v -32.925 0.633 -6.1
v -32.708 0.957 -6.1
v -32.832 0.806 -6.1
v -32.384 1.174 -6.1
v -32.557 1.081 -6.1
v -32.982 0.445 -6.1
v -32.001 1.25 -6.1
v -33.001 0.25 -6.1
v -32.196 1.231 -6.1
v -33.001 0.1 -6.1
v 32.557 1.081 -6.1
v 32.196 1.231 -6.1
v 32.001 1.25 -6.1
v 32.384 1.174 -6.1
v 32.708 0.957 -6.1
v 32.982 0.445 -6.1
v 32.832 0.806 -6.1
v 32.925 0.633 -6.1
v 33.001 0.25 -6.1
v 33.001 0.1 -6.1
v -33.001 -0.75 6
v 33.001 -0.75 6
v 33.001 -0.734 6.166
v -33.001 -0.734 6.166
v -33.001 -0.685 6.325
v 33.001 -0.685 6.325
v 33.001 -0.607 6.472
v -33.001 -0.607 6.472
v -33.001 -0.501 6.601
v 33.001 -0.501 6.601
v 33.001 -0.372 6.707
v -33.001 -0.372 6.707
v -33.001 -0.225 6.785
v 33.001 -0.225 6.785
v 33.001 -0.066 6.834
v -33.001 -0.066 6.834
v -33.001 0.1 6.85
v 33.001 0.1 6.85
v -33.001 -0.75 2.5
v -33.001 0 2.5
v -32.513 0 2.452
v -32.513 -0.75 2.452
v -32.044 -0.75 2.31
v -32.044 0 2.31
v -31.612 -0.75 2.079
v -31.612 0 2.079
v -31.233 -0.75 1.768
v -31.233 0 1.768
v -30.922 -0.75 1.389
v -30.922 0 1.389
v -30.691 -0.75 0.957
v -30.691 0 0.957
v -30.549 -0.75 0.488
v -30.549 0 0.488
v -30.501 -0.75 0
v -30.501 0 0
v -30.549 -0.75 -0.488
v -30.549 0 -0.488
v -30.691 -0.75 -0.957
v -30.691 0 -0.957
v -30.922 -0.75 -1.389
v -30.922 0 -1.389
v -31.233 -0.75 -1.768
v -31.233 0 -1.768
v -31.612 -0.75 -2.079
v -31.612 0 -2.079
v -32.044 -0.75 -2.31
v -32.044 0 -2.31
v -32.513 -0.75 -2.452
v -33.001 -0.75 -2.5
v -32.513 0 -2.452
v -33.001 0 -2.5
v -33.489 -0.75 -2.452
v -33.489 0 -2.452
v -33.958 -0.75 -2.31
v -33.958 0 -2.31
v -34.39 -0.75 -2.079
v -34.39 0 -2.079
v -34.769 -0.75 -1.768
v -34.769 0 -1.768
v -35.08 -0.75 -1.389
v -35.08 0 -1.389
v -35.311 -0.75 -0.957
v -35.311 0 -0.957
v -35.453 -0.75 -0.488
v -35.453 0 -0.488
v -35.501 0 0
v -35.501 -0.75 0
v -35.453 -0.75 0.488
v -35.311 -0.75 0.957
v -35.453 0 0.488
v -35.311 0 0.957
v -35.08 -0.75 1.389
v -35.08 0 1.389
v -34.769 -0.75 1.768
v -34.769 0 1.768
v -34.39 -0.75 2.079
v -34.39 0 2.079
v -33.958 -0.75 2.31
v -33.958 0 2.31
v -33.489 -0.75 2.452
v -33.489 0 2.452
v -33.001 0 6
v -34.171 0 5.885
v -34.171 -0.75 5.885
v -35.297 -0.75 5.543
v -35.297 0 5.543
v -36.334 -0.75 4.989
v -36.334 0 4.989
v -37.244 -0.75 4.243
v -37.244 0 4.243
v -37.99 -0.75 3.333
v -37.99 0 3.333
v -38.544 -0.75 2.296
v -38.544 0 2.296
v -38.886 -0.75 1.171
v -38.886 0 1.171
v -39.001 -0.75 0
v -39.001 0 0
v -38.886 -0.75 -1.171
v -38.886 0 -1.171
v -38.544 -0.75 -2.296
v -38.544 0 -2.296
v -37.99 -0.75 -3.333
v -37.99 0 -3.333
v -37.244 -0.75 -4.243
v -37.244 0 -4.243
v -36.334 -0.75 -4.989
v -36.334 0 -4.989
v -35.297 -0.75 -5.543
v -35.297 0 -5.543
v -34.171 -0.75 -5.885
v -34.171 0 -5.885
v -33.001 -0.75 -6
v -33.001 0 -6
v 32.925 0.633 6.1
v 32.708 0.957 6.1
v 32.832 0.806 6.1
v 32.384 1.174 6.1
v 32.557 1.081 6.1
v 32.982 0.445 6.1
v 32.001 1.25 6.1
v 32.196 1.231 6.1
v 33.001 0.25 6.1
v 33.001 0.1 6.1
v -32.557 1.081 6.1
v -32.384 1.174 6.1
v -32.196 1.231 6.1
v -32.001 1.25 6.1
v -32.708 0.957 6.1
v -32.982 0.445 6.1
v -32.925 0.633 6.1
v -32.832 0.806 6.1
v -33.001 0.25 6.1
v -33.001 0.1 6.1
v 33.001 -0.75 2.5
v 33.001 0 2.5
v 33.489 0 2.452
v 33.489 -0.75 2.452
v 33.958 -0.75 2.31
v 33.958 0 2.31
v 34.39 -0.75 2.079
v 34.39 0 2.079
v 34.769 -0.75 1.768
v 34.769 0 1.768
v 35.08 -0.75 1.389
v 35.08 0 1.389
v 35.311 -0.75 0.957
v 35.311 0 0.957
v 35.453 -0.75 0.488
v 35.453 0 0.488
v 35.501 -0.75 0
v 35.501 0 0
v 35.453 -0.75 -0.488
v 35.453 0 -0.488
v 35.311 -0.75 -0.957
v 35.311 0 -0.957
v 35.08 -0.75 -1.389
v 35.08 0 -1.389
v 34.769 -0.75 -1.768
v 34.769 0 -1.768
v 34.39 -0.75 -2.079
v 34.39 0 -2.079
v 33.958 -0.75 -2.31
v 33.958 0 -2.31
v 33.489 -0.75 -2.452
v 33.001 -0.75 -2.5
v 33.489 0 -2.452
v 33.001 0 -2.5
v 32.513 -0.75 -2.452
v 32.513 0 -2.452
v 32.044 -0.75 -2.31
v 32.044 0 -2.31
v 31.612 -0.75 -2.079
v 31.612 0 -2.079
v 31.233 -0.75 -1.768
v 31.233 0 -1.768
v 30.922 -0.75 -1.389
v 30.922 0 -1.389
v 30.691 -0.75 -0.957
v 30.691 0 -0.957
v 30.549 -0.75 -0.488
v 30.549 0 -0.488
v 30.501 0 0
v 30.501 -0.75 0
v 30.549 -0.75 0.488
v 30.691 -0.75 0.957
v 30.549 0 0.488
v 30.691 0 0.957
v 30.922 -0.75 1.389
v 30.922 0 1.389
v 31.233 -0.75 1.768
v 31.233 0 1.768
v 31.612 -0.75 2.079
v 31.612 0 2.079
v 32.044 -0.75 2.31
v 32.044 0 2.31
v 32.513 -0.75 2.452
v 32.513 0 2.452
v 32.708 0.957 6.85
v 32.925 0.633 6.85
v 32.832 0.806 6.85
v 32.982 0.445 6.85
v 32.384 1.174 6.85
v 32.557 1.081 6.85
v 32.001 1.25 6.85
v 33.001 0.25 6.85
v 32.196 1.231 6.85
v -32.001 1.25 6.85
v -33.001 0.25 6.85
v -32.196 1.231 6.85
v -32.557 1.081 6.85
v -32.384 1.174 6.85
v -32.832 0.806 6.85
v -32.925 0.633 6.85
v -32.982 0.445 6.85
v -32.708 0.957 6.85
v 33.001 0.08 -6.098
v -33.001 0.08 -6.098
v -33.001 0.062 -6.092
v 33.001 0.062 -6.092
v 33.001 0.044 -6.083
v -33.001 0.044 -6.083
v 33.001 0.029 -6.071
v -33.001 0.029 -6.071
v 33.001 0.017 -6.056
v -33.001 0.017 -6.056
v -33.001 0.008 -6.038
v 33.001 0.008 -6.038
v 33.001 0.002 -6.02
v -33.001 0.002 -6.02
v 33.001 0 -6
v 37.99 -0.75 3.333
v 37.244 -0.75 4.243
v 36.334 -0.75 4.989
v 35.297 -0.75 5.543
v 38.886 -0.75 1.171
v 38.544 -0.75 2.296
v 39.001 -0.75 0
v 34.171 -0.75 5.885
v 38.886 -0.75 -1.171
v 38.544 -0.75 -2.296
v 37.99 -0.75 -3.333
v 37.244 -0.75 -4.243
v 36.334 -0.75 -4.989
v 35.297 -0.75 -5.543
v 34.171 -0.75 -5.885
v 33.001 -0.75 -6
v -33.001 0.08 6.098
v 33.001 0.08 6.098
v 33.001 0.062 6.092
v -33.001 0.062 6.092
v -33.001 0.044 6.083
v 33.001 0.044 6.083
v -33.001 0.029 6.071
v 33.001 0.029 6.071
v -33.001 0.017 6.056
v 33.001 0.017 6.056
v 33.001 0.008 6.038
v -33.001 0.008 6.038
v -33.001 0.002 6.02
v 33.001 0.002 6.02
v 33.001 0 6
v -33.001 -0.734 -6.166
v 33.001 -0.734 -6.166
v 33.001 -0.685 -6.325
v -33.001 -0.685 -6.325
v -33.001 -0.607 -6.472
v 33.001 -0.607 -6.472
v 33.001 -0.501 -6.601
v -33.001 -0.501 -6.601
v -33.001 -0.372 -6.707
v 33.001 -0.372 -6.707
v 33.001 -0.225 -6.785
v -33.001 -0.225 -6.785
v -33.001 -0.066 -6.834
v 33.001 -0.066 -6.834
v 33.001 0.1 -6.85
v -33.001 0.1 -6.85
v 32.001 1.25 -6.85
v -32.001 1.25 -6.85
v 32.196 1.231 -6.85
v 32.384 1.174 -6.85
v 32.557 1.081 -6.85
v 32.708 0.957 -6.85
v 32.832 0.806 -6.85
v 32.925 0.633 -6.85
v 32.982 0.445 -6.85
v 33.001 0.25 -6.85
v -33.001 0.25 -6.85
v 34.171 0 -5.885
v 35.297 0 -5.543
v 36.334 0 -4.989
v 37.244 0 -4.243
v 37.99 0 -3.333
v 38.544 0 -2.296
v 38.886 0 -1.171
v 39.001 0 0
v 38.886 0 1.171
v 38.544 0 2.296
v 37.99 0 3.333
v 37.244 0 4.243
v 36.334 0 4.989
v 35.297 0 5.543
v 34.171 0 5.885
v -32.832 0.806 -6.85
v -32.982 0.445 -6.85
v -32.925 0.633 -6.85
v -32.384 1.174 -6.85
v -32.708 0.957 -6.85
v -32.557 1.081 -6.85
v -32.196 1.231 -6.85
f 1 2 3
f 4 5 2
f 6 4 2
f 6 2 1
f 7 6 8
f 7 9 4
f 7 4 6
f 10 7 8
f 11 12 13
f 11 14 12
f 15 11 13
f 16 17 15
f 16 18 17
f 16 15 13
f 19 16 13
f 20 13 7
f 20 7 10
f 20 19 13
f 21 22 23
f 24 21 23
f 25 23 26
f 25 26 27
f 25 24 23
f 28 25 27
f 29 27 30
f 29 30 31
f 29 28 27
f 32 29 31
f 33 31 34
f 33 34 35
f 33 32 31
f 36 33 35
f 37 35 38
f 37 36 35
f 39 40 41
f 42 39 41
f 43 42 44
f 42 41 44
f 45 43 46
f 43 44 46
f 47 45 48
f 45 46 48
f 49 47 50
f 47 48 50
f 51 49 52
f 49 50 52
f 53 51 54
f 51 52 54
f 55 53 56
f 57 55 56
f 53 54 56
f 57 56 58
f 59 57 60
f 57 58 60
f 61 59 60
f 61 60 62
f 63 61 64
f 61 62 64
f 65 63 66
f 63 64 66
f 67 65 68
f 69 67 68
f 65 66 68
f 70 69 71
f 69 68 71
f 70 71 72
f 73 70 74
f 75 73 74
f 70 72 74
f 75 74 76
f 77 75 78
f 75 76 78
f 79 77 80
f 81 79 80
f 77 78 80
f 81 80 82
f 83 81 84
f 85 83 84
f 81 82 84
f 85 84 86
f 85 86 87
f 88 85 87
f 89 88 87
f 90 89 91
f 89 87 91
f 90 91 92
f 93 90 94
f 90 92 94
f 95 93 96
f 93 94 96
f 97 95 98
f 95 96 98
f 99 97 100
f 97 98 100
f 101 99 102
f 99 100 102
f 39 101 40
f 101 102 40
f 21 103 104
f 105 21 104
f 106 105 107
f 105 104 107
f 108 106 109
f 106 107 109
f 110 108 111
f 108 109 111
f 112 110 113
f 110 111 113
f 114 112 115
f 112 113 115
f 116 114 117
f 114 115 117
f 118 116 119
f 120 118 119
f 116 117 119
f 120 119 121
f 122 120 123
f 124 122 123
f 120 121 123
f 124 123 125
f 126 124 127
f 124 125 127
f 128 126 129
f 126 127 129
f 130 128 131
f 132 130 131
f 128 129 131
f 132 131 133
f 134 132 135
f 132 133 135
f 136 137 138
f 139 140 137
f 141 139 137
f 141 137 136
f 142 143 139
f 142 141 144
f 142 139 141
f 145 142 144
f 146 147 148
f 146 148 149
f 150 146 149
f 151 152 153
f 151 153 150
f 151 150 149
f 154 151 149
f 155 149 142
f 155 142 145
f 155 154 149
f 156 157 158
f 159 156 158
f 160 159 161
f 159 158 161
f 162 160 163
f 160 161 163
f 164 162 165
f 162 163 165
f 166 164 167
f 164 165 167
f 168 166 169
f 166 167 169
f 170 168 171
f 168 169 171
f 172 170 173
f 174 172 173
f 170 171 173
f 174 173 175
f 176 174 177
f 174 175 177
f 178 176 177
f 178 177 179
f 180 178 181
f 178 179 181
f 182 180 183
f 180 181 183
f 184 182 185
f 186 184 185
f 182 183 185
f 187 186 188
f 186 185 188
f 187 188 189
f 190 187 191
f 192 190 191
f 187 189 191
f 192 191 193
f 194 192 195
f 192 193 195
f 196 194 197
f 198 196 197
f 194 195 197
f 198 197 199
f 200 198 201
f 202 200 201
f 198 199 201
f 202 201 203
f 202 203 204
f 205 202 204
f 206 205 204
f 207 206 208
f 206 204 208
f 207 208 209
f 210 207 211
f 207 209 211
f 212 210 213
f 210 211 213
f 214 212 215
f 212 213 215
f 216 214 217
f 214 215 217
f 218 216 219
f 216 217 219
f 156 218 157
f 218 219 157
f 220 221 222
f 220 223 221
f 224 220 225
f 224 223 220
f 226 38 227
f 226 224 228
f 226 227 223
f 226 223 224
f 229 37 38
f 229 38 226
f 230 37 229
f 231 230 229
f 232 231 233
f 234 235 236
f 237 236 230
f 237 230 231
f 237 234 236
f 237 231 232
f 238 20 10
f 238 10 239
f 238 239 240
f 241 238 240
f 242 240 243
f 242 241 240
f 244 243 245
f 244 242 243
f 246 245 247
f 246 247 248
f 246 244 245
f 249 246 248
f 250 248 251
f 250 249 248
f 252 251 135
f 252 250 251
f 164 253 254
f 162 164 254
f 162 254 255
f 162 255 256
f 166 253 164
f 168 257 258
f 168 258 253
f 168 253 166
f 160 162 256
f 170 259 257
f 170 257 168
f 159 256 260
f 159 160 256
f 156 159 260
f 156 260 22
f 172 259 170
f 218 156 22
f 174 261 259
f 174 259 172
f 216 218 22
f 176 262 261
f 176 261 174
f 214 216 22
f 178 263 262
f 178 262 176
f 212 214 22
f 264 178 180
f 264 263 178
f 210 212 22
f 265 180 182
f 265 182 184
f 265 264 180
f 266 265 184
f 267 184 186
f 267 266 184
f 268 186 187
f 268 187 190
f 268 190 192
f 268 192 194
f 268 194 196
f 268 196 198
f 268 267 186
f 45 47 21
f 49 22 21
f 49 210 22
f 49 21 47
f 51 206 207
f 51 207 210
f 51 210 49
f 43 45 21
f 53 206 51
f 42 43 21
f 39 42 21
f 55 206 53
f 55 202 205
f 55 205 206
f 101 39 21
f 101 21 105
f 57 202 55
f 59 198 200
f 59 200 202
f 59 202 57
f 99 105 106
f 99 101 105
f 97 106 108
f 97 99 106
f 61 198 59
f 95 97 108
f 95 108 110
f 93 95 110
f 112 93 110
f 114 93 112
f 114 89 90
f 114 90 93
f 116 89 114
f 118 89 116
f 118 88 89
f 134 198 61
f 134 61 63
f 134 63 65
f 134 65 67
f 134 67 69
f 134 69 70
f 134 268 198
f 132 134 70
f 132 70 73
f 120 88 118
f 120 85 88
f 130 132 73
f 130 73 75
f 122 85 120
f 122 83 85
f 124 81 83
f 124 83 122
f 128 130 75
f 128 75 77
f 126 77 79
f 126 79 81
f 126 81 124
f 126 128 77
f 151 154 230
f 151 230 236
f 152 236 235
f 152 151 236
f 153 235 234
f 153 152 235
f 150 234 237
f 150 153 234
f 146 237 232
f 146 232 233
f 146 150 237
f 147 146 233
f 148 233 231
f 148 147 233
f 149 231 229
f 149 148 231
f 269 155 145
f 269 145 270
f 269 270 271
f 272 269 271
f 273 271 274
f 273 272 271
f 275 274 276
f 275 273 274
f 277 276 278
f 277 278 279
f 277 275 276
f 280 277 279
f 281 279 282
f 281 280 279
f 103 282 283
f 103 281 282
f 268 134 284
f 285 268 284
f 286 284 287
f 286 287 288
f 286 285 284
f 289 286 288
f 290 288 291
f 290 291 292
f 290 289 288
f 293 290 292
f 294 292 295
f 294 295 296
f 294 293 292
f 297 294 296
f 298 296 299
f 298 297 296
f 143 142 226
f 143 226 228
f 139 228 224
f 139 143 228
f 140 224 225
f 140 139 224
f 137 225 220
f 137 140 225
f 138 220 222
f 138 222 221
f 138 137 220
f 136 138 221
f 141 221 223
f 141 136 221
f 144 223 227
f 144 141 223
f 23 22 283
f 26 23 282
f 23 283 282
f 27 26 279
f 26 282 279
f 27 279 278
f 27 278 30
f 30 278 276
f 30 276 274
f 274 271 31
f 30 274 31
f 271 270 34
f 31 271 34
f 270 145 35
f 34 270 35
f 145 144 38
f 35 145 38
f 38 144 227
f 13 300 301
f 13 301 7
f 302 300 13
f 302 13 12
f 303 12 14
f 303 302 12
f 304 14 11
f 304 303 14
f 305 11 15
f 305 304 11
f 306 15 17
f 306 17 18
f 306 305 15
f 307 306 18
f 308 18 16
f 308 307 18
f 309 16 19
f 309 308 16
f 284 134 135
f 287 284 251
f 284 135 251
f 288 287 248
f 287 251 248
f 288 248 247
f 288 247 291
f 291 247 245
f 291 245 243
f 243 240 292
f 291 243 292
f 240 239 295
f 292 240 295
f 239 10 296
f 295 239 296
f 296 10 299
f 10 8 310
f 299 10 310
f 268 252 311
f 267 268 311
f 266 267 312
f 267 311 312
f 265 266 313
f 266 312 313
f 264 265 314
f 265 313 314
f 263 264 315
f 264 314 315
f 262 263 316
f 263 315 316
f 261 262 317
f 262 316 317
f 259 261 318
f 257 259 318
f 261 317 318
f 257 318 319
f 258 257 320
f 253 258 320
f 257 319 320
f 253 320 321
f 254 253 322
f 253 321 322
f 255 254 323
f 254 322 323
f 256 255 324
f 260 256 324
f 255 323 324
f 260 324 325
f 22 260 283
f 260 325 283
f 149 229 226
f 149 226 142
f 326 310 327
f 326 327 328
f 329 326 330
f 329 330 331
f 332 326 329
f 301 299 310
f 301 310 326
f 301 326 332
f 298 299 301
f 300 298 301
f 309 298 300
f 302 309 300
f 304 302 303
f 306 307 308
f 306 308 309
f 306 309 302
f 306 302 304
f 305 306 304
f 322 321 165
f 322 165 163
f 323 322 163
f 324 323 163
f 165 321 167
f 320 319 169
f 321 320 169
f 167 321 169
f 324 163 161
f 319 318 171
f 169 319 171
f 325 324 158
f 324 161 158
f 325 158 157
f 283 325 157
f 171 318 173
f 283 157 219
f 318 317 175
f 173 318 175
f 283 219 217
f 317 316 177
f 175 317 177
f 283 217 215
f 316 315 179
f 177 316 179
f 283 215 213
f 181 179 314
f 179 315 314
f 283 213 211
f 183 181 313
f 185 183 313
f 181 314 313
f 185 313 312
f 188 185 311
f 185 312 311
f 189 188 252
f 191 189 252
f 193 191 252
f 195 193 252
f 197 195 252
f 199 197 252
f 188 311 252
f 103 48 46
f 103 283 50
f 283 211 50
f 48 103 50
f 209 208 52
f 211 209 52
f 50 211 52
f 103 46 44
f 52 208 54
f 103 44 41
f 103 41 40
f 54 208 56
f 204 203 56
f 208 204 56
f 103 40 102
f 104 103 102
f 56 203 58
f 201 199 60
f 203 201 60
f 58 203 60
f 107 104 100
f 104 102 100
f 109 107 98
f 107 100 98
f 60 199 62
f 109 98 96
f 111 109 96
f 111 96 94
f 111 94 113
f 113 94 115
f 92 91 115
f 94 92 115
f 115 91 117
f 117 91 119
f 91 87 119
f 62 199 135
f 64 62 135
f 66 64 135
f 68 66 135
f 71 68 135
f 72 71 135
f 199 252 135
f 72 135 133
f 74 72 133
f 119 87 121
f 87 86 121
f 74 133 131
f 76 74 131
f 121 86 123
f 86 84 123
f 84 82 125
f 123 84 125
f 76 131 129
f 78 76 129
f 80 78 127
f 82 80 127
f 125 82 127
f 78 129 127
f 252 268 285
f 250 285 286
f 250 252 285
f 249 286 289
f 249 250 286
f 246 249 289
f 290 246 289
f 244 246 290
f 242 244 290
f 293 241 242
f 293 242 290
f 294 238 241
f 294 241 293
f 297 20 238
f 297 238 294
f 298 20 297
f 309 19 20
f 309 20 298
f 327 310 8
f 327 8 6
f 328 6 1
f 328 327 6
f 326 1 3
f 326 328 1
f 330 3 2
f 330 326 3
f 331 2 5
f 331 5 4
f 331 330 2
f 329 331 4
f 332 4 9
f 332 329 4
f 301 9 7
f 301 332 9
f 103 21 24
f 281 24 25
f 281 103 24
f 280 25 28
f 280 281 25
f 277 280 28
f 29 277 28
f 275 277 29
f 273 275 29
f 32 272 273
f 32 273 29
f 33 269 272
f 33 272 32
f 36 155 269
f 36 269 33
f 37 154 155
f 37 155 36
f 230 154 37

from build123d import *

# Parameters (mm, degrees)
SKETCH2_R               = 2.5
BASE_FLANGE1_DEPTH      = 0.75
EDGE_FLANGE1_DEPTH      = 66.001893912
EDGE_FLANGE1_BEND_DEPTH = 66.001893912
BREAK_CORNER1_START     = -6.85
BREAK_CORNER1_DEPTH     = 13.7


# Read off the part's stored shape, not the designer's step: Break-Corner1
# Sheet-metal steps are written as plain solids
with BuildPart() as part:
    # Sketch2 → Base-Flange1 (new body)
    with BuildSketch(Plane(origin=(0, 0, 0), x_dir=(1, 0, 0), z_dir=(0, 1, 0))):
        with BuildLine():
            Line((-33.000946956, 6), (33.000946956, 6))
            ThreePointArc((33.000946956, 6), (39.000946956, 0), (33.000946956, -6))
            Line((33.000946956, -6), (-33.000946956, -6))
            ThreePointArc((-33.000946956, -6), (-39.000946956, 0), (-33.000946956, 6))
        make_face()
        with Locations(Location((33.000946956, 0, 0), (0, 0, 270))):
            Circle(SKETCH2_R, mode=Mode.SUBTRACT)
        with Locations(Location((-33.000946956, 0, 0), (0, 0, 270))):
            Circle(SKETCH2_R, mode=Mode.SUBTRACT)
    extrude(amount=-BASE_FLANGE1_DEPTH)

    # Edge-Flange1 section (across the edge) → Edge-Flange1 (add)
    with BuildSketch(Plane(origin=(-33.000946956, 0, 6.1), x_dir=(0, 0, -1), z_dir=(1, 0, 0))):
        with BuildLine():
            Line((-0.75, 0.1), (-0.75, 1.25))
            Line((-0.75, 1.25), (0, 1.25))
            Line((0, 1.25), (0, 0.1))
            ThreePointArc((0, 0.1), (0.029289322, 0.029289322), (0.1, 0))
            Line((0.1, 0), (0.1, -0.75))
            ThreePointArc((0.1, -0.75), (-0.501040764, -0.501040764), (-0.75, 0.1))
        make_face()
    extrude(amount=EDGE_FLANGE1_DEPTH)

    # Edge-Flange1 section 2 (across the edge) → Edge-Flange1 bend (add)
    with BuildSketch(Plane(origin=(33.000946956, 0, -6.1), x_dir=(0, 0, 1), z_dir=(-1, 0, 0))):
        with BuildLine():
            Line((-0.75, 0.1), (-0.75, 1.25))
            Line((-0.75, 1.25), (0, 1.25))
            Line((0, 1.25), (0, 0.1))
            ThreePointArc((0, 0.1), (0.029289322, 0.029289322), (0.1, 0))
            Line((0.1, 0), (0.1, -0.75))
            ThreePointArc((0.1, -0.75), (-0.501040764, -0.501040764), (-0.75, 0.1))
        make_face()
    extrude(amount=EDGE_FLANGE1_BEND_DEPTH)

    # Break-Corner1 outline → Break-Corner1 (cut)
    with BuildSketch(Plane.XY.offset(BREAK_CORNER1_START)):
        with BuildLine():
            ThreePointArc((-33.000946956, 0.25), (-32.708053737, 0.957106781), (-32.000946956, 1.25))
            Line((-32.000946956, 1.25), (-33.000946956, 1.25))
            Line((-33.000946956, 1.25), (-33.000946956, 0.25))
        make_face()
        with BuildLine():
            ThreePointArc((32.000946956, 1.25), (32.708053737, 0.957106781), (33.000946956, 0.25))
            Line((33.000946956, 0.25), (33.000946956, 1.25))
            Line((33.000946956, 1.25), (32.000946956, 1.25))
        make_face()
    extrude(amount=BREAK_CORNER1_DEPTH, mode=Mode.SUBTRACT)


solid = part.part
